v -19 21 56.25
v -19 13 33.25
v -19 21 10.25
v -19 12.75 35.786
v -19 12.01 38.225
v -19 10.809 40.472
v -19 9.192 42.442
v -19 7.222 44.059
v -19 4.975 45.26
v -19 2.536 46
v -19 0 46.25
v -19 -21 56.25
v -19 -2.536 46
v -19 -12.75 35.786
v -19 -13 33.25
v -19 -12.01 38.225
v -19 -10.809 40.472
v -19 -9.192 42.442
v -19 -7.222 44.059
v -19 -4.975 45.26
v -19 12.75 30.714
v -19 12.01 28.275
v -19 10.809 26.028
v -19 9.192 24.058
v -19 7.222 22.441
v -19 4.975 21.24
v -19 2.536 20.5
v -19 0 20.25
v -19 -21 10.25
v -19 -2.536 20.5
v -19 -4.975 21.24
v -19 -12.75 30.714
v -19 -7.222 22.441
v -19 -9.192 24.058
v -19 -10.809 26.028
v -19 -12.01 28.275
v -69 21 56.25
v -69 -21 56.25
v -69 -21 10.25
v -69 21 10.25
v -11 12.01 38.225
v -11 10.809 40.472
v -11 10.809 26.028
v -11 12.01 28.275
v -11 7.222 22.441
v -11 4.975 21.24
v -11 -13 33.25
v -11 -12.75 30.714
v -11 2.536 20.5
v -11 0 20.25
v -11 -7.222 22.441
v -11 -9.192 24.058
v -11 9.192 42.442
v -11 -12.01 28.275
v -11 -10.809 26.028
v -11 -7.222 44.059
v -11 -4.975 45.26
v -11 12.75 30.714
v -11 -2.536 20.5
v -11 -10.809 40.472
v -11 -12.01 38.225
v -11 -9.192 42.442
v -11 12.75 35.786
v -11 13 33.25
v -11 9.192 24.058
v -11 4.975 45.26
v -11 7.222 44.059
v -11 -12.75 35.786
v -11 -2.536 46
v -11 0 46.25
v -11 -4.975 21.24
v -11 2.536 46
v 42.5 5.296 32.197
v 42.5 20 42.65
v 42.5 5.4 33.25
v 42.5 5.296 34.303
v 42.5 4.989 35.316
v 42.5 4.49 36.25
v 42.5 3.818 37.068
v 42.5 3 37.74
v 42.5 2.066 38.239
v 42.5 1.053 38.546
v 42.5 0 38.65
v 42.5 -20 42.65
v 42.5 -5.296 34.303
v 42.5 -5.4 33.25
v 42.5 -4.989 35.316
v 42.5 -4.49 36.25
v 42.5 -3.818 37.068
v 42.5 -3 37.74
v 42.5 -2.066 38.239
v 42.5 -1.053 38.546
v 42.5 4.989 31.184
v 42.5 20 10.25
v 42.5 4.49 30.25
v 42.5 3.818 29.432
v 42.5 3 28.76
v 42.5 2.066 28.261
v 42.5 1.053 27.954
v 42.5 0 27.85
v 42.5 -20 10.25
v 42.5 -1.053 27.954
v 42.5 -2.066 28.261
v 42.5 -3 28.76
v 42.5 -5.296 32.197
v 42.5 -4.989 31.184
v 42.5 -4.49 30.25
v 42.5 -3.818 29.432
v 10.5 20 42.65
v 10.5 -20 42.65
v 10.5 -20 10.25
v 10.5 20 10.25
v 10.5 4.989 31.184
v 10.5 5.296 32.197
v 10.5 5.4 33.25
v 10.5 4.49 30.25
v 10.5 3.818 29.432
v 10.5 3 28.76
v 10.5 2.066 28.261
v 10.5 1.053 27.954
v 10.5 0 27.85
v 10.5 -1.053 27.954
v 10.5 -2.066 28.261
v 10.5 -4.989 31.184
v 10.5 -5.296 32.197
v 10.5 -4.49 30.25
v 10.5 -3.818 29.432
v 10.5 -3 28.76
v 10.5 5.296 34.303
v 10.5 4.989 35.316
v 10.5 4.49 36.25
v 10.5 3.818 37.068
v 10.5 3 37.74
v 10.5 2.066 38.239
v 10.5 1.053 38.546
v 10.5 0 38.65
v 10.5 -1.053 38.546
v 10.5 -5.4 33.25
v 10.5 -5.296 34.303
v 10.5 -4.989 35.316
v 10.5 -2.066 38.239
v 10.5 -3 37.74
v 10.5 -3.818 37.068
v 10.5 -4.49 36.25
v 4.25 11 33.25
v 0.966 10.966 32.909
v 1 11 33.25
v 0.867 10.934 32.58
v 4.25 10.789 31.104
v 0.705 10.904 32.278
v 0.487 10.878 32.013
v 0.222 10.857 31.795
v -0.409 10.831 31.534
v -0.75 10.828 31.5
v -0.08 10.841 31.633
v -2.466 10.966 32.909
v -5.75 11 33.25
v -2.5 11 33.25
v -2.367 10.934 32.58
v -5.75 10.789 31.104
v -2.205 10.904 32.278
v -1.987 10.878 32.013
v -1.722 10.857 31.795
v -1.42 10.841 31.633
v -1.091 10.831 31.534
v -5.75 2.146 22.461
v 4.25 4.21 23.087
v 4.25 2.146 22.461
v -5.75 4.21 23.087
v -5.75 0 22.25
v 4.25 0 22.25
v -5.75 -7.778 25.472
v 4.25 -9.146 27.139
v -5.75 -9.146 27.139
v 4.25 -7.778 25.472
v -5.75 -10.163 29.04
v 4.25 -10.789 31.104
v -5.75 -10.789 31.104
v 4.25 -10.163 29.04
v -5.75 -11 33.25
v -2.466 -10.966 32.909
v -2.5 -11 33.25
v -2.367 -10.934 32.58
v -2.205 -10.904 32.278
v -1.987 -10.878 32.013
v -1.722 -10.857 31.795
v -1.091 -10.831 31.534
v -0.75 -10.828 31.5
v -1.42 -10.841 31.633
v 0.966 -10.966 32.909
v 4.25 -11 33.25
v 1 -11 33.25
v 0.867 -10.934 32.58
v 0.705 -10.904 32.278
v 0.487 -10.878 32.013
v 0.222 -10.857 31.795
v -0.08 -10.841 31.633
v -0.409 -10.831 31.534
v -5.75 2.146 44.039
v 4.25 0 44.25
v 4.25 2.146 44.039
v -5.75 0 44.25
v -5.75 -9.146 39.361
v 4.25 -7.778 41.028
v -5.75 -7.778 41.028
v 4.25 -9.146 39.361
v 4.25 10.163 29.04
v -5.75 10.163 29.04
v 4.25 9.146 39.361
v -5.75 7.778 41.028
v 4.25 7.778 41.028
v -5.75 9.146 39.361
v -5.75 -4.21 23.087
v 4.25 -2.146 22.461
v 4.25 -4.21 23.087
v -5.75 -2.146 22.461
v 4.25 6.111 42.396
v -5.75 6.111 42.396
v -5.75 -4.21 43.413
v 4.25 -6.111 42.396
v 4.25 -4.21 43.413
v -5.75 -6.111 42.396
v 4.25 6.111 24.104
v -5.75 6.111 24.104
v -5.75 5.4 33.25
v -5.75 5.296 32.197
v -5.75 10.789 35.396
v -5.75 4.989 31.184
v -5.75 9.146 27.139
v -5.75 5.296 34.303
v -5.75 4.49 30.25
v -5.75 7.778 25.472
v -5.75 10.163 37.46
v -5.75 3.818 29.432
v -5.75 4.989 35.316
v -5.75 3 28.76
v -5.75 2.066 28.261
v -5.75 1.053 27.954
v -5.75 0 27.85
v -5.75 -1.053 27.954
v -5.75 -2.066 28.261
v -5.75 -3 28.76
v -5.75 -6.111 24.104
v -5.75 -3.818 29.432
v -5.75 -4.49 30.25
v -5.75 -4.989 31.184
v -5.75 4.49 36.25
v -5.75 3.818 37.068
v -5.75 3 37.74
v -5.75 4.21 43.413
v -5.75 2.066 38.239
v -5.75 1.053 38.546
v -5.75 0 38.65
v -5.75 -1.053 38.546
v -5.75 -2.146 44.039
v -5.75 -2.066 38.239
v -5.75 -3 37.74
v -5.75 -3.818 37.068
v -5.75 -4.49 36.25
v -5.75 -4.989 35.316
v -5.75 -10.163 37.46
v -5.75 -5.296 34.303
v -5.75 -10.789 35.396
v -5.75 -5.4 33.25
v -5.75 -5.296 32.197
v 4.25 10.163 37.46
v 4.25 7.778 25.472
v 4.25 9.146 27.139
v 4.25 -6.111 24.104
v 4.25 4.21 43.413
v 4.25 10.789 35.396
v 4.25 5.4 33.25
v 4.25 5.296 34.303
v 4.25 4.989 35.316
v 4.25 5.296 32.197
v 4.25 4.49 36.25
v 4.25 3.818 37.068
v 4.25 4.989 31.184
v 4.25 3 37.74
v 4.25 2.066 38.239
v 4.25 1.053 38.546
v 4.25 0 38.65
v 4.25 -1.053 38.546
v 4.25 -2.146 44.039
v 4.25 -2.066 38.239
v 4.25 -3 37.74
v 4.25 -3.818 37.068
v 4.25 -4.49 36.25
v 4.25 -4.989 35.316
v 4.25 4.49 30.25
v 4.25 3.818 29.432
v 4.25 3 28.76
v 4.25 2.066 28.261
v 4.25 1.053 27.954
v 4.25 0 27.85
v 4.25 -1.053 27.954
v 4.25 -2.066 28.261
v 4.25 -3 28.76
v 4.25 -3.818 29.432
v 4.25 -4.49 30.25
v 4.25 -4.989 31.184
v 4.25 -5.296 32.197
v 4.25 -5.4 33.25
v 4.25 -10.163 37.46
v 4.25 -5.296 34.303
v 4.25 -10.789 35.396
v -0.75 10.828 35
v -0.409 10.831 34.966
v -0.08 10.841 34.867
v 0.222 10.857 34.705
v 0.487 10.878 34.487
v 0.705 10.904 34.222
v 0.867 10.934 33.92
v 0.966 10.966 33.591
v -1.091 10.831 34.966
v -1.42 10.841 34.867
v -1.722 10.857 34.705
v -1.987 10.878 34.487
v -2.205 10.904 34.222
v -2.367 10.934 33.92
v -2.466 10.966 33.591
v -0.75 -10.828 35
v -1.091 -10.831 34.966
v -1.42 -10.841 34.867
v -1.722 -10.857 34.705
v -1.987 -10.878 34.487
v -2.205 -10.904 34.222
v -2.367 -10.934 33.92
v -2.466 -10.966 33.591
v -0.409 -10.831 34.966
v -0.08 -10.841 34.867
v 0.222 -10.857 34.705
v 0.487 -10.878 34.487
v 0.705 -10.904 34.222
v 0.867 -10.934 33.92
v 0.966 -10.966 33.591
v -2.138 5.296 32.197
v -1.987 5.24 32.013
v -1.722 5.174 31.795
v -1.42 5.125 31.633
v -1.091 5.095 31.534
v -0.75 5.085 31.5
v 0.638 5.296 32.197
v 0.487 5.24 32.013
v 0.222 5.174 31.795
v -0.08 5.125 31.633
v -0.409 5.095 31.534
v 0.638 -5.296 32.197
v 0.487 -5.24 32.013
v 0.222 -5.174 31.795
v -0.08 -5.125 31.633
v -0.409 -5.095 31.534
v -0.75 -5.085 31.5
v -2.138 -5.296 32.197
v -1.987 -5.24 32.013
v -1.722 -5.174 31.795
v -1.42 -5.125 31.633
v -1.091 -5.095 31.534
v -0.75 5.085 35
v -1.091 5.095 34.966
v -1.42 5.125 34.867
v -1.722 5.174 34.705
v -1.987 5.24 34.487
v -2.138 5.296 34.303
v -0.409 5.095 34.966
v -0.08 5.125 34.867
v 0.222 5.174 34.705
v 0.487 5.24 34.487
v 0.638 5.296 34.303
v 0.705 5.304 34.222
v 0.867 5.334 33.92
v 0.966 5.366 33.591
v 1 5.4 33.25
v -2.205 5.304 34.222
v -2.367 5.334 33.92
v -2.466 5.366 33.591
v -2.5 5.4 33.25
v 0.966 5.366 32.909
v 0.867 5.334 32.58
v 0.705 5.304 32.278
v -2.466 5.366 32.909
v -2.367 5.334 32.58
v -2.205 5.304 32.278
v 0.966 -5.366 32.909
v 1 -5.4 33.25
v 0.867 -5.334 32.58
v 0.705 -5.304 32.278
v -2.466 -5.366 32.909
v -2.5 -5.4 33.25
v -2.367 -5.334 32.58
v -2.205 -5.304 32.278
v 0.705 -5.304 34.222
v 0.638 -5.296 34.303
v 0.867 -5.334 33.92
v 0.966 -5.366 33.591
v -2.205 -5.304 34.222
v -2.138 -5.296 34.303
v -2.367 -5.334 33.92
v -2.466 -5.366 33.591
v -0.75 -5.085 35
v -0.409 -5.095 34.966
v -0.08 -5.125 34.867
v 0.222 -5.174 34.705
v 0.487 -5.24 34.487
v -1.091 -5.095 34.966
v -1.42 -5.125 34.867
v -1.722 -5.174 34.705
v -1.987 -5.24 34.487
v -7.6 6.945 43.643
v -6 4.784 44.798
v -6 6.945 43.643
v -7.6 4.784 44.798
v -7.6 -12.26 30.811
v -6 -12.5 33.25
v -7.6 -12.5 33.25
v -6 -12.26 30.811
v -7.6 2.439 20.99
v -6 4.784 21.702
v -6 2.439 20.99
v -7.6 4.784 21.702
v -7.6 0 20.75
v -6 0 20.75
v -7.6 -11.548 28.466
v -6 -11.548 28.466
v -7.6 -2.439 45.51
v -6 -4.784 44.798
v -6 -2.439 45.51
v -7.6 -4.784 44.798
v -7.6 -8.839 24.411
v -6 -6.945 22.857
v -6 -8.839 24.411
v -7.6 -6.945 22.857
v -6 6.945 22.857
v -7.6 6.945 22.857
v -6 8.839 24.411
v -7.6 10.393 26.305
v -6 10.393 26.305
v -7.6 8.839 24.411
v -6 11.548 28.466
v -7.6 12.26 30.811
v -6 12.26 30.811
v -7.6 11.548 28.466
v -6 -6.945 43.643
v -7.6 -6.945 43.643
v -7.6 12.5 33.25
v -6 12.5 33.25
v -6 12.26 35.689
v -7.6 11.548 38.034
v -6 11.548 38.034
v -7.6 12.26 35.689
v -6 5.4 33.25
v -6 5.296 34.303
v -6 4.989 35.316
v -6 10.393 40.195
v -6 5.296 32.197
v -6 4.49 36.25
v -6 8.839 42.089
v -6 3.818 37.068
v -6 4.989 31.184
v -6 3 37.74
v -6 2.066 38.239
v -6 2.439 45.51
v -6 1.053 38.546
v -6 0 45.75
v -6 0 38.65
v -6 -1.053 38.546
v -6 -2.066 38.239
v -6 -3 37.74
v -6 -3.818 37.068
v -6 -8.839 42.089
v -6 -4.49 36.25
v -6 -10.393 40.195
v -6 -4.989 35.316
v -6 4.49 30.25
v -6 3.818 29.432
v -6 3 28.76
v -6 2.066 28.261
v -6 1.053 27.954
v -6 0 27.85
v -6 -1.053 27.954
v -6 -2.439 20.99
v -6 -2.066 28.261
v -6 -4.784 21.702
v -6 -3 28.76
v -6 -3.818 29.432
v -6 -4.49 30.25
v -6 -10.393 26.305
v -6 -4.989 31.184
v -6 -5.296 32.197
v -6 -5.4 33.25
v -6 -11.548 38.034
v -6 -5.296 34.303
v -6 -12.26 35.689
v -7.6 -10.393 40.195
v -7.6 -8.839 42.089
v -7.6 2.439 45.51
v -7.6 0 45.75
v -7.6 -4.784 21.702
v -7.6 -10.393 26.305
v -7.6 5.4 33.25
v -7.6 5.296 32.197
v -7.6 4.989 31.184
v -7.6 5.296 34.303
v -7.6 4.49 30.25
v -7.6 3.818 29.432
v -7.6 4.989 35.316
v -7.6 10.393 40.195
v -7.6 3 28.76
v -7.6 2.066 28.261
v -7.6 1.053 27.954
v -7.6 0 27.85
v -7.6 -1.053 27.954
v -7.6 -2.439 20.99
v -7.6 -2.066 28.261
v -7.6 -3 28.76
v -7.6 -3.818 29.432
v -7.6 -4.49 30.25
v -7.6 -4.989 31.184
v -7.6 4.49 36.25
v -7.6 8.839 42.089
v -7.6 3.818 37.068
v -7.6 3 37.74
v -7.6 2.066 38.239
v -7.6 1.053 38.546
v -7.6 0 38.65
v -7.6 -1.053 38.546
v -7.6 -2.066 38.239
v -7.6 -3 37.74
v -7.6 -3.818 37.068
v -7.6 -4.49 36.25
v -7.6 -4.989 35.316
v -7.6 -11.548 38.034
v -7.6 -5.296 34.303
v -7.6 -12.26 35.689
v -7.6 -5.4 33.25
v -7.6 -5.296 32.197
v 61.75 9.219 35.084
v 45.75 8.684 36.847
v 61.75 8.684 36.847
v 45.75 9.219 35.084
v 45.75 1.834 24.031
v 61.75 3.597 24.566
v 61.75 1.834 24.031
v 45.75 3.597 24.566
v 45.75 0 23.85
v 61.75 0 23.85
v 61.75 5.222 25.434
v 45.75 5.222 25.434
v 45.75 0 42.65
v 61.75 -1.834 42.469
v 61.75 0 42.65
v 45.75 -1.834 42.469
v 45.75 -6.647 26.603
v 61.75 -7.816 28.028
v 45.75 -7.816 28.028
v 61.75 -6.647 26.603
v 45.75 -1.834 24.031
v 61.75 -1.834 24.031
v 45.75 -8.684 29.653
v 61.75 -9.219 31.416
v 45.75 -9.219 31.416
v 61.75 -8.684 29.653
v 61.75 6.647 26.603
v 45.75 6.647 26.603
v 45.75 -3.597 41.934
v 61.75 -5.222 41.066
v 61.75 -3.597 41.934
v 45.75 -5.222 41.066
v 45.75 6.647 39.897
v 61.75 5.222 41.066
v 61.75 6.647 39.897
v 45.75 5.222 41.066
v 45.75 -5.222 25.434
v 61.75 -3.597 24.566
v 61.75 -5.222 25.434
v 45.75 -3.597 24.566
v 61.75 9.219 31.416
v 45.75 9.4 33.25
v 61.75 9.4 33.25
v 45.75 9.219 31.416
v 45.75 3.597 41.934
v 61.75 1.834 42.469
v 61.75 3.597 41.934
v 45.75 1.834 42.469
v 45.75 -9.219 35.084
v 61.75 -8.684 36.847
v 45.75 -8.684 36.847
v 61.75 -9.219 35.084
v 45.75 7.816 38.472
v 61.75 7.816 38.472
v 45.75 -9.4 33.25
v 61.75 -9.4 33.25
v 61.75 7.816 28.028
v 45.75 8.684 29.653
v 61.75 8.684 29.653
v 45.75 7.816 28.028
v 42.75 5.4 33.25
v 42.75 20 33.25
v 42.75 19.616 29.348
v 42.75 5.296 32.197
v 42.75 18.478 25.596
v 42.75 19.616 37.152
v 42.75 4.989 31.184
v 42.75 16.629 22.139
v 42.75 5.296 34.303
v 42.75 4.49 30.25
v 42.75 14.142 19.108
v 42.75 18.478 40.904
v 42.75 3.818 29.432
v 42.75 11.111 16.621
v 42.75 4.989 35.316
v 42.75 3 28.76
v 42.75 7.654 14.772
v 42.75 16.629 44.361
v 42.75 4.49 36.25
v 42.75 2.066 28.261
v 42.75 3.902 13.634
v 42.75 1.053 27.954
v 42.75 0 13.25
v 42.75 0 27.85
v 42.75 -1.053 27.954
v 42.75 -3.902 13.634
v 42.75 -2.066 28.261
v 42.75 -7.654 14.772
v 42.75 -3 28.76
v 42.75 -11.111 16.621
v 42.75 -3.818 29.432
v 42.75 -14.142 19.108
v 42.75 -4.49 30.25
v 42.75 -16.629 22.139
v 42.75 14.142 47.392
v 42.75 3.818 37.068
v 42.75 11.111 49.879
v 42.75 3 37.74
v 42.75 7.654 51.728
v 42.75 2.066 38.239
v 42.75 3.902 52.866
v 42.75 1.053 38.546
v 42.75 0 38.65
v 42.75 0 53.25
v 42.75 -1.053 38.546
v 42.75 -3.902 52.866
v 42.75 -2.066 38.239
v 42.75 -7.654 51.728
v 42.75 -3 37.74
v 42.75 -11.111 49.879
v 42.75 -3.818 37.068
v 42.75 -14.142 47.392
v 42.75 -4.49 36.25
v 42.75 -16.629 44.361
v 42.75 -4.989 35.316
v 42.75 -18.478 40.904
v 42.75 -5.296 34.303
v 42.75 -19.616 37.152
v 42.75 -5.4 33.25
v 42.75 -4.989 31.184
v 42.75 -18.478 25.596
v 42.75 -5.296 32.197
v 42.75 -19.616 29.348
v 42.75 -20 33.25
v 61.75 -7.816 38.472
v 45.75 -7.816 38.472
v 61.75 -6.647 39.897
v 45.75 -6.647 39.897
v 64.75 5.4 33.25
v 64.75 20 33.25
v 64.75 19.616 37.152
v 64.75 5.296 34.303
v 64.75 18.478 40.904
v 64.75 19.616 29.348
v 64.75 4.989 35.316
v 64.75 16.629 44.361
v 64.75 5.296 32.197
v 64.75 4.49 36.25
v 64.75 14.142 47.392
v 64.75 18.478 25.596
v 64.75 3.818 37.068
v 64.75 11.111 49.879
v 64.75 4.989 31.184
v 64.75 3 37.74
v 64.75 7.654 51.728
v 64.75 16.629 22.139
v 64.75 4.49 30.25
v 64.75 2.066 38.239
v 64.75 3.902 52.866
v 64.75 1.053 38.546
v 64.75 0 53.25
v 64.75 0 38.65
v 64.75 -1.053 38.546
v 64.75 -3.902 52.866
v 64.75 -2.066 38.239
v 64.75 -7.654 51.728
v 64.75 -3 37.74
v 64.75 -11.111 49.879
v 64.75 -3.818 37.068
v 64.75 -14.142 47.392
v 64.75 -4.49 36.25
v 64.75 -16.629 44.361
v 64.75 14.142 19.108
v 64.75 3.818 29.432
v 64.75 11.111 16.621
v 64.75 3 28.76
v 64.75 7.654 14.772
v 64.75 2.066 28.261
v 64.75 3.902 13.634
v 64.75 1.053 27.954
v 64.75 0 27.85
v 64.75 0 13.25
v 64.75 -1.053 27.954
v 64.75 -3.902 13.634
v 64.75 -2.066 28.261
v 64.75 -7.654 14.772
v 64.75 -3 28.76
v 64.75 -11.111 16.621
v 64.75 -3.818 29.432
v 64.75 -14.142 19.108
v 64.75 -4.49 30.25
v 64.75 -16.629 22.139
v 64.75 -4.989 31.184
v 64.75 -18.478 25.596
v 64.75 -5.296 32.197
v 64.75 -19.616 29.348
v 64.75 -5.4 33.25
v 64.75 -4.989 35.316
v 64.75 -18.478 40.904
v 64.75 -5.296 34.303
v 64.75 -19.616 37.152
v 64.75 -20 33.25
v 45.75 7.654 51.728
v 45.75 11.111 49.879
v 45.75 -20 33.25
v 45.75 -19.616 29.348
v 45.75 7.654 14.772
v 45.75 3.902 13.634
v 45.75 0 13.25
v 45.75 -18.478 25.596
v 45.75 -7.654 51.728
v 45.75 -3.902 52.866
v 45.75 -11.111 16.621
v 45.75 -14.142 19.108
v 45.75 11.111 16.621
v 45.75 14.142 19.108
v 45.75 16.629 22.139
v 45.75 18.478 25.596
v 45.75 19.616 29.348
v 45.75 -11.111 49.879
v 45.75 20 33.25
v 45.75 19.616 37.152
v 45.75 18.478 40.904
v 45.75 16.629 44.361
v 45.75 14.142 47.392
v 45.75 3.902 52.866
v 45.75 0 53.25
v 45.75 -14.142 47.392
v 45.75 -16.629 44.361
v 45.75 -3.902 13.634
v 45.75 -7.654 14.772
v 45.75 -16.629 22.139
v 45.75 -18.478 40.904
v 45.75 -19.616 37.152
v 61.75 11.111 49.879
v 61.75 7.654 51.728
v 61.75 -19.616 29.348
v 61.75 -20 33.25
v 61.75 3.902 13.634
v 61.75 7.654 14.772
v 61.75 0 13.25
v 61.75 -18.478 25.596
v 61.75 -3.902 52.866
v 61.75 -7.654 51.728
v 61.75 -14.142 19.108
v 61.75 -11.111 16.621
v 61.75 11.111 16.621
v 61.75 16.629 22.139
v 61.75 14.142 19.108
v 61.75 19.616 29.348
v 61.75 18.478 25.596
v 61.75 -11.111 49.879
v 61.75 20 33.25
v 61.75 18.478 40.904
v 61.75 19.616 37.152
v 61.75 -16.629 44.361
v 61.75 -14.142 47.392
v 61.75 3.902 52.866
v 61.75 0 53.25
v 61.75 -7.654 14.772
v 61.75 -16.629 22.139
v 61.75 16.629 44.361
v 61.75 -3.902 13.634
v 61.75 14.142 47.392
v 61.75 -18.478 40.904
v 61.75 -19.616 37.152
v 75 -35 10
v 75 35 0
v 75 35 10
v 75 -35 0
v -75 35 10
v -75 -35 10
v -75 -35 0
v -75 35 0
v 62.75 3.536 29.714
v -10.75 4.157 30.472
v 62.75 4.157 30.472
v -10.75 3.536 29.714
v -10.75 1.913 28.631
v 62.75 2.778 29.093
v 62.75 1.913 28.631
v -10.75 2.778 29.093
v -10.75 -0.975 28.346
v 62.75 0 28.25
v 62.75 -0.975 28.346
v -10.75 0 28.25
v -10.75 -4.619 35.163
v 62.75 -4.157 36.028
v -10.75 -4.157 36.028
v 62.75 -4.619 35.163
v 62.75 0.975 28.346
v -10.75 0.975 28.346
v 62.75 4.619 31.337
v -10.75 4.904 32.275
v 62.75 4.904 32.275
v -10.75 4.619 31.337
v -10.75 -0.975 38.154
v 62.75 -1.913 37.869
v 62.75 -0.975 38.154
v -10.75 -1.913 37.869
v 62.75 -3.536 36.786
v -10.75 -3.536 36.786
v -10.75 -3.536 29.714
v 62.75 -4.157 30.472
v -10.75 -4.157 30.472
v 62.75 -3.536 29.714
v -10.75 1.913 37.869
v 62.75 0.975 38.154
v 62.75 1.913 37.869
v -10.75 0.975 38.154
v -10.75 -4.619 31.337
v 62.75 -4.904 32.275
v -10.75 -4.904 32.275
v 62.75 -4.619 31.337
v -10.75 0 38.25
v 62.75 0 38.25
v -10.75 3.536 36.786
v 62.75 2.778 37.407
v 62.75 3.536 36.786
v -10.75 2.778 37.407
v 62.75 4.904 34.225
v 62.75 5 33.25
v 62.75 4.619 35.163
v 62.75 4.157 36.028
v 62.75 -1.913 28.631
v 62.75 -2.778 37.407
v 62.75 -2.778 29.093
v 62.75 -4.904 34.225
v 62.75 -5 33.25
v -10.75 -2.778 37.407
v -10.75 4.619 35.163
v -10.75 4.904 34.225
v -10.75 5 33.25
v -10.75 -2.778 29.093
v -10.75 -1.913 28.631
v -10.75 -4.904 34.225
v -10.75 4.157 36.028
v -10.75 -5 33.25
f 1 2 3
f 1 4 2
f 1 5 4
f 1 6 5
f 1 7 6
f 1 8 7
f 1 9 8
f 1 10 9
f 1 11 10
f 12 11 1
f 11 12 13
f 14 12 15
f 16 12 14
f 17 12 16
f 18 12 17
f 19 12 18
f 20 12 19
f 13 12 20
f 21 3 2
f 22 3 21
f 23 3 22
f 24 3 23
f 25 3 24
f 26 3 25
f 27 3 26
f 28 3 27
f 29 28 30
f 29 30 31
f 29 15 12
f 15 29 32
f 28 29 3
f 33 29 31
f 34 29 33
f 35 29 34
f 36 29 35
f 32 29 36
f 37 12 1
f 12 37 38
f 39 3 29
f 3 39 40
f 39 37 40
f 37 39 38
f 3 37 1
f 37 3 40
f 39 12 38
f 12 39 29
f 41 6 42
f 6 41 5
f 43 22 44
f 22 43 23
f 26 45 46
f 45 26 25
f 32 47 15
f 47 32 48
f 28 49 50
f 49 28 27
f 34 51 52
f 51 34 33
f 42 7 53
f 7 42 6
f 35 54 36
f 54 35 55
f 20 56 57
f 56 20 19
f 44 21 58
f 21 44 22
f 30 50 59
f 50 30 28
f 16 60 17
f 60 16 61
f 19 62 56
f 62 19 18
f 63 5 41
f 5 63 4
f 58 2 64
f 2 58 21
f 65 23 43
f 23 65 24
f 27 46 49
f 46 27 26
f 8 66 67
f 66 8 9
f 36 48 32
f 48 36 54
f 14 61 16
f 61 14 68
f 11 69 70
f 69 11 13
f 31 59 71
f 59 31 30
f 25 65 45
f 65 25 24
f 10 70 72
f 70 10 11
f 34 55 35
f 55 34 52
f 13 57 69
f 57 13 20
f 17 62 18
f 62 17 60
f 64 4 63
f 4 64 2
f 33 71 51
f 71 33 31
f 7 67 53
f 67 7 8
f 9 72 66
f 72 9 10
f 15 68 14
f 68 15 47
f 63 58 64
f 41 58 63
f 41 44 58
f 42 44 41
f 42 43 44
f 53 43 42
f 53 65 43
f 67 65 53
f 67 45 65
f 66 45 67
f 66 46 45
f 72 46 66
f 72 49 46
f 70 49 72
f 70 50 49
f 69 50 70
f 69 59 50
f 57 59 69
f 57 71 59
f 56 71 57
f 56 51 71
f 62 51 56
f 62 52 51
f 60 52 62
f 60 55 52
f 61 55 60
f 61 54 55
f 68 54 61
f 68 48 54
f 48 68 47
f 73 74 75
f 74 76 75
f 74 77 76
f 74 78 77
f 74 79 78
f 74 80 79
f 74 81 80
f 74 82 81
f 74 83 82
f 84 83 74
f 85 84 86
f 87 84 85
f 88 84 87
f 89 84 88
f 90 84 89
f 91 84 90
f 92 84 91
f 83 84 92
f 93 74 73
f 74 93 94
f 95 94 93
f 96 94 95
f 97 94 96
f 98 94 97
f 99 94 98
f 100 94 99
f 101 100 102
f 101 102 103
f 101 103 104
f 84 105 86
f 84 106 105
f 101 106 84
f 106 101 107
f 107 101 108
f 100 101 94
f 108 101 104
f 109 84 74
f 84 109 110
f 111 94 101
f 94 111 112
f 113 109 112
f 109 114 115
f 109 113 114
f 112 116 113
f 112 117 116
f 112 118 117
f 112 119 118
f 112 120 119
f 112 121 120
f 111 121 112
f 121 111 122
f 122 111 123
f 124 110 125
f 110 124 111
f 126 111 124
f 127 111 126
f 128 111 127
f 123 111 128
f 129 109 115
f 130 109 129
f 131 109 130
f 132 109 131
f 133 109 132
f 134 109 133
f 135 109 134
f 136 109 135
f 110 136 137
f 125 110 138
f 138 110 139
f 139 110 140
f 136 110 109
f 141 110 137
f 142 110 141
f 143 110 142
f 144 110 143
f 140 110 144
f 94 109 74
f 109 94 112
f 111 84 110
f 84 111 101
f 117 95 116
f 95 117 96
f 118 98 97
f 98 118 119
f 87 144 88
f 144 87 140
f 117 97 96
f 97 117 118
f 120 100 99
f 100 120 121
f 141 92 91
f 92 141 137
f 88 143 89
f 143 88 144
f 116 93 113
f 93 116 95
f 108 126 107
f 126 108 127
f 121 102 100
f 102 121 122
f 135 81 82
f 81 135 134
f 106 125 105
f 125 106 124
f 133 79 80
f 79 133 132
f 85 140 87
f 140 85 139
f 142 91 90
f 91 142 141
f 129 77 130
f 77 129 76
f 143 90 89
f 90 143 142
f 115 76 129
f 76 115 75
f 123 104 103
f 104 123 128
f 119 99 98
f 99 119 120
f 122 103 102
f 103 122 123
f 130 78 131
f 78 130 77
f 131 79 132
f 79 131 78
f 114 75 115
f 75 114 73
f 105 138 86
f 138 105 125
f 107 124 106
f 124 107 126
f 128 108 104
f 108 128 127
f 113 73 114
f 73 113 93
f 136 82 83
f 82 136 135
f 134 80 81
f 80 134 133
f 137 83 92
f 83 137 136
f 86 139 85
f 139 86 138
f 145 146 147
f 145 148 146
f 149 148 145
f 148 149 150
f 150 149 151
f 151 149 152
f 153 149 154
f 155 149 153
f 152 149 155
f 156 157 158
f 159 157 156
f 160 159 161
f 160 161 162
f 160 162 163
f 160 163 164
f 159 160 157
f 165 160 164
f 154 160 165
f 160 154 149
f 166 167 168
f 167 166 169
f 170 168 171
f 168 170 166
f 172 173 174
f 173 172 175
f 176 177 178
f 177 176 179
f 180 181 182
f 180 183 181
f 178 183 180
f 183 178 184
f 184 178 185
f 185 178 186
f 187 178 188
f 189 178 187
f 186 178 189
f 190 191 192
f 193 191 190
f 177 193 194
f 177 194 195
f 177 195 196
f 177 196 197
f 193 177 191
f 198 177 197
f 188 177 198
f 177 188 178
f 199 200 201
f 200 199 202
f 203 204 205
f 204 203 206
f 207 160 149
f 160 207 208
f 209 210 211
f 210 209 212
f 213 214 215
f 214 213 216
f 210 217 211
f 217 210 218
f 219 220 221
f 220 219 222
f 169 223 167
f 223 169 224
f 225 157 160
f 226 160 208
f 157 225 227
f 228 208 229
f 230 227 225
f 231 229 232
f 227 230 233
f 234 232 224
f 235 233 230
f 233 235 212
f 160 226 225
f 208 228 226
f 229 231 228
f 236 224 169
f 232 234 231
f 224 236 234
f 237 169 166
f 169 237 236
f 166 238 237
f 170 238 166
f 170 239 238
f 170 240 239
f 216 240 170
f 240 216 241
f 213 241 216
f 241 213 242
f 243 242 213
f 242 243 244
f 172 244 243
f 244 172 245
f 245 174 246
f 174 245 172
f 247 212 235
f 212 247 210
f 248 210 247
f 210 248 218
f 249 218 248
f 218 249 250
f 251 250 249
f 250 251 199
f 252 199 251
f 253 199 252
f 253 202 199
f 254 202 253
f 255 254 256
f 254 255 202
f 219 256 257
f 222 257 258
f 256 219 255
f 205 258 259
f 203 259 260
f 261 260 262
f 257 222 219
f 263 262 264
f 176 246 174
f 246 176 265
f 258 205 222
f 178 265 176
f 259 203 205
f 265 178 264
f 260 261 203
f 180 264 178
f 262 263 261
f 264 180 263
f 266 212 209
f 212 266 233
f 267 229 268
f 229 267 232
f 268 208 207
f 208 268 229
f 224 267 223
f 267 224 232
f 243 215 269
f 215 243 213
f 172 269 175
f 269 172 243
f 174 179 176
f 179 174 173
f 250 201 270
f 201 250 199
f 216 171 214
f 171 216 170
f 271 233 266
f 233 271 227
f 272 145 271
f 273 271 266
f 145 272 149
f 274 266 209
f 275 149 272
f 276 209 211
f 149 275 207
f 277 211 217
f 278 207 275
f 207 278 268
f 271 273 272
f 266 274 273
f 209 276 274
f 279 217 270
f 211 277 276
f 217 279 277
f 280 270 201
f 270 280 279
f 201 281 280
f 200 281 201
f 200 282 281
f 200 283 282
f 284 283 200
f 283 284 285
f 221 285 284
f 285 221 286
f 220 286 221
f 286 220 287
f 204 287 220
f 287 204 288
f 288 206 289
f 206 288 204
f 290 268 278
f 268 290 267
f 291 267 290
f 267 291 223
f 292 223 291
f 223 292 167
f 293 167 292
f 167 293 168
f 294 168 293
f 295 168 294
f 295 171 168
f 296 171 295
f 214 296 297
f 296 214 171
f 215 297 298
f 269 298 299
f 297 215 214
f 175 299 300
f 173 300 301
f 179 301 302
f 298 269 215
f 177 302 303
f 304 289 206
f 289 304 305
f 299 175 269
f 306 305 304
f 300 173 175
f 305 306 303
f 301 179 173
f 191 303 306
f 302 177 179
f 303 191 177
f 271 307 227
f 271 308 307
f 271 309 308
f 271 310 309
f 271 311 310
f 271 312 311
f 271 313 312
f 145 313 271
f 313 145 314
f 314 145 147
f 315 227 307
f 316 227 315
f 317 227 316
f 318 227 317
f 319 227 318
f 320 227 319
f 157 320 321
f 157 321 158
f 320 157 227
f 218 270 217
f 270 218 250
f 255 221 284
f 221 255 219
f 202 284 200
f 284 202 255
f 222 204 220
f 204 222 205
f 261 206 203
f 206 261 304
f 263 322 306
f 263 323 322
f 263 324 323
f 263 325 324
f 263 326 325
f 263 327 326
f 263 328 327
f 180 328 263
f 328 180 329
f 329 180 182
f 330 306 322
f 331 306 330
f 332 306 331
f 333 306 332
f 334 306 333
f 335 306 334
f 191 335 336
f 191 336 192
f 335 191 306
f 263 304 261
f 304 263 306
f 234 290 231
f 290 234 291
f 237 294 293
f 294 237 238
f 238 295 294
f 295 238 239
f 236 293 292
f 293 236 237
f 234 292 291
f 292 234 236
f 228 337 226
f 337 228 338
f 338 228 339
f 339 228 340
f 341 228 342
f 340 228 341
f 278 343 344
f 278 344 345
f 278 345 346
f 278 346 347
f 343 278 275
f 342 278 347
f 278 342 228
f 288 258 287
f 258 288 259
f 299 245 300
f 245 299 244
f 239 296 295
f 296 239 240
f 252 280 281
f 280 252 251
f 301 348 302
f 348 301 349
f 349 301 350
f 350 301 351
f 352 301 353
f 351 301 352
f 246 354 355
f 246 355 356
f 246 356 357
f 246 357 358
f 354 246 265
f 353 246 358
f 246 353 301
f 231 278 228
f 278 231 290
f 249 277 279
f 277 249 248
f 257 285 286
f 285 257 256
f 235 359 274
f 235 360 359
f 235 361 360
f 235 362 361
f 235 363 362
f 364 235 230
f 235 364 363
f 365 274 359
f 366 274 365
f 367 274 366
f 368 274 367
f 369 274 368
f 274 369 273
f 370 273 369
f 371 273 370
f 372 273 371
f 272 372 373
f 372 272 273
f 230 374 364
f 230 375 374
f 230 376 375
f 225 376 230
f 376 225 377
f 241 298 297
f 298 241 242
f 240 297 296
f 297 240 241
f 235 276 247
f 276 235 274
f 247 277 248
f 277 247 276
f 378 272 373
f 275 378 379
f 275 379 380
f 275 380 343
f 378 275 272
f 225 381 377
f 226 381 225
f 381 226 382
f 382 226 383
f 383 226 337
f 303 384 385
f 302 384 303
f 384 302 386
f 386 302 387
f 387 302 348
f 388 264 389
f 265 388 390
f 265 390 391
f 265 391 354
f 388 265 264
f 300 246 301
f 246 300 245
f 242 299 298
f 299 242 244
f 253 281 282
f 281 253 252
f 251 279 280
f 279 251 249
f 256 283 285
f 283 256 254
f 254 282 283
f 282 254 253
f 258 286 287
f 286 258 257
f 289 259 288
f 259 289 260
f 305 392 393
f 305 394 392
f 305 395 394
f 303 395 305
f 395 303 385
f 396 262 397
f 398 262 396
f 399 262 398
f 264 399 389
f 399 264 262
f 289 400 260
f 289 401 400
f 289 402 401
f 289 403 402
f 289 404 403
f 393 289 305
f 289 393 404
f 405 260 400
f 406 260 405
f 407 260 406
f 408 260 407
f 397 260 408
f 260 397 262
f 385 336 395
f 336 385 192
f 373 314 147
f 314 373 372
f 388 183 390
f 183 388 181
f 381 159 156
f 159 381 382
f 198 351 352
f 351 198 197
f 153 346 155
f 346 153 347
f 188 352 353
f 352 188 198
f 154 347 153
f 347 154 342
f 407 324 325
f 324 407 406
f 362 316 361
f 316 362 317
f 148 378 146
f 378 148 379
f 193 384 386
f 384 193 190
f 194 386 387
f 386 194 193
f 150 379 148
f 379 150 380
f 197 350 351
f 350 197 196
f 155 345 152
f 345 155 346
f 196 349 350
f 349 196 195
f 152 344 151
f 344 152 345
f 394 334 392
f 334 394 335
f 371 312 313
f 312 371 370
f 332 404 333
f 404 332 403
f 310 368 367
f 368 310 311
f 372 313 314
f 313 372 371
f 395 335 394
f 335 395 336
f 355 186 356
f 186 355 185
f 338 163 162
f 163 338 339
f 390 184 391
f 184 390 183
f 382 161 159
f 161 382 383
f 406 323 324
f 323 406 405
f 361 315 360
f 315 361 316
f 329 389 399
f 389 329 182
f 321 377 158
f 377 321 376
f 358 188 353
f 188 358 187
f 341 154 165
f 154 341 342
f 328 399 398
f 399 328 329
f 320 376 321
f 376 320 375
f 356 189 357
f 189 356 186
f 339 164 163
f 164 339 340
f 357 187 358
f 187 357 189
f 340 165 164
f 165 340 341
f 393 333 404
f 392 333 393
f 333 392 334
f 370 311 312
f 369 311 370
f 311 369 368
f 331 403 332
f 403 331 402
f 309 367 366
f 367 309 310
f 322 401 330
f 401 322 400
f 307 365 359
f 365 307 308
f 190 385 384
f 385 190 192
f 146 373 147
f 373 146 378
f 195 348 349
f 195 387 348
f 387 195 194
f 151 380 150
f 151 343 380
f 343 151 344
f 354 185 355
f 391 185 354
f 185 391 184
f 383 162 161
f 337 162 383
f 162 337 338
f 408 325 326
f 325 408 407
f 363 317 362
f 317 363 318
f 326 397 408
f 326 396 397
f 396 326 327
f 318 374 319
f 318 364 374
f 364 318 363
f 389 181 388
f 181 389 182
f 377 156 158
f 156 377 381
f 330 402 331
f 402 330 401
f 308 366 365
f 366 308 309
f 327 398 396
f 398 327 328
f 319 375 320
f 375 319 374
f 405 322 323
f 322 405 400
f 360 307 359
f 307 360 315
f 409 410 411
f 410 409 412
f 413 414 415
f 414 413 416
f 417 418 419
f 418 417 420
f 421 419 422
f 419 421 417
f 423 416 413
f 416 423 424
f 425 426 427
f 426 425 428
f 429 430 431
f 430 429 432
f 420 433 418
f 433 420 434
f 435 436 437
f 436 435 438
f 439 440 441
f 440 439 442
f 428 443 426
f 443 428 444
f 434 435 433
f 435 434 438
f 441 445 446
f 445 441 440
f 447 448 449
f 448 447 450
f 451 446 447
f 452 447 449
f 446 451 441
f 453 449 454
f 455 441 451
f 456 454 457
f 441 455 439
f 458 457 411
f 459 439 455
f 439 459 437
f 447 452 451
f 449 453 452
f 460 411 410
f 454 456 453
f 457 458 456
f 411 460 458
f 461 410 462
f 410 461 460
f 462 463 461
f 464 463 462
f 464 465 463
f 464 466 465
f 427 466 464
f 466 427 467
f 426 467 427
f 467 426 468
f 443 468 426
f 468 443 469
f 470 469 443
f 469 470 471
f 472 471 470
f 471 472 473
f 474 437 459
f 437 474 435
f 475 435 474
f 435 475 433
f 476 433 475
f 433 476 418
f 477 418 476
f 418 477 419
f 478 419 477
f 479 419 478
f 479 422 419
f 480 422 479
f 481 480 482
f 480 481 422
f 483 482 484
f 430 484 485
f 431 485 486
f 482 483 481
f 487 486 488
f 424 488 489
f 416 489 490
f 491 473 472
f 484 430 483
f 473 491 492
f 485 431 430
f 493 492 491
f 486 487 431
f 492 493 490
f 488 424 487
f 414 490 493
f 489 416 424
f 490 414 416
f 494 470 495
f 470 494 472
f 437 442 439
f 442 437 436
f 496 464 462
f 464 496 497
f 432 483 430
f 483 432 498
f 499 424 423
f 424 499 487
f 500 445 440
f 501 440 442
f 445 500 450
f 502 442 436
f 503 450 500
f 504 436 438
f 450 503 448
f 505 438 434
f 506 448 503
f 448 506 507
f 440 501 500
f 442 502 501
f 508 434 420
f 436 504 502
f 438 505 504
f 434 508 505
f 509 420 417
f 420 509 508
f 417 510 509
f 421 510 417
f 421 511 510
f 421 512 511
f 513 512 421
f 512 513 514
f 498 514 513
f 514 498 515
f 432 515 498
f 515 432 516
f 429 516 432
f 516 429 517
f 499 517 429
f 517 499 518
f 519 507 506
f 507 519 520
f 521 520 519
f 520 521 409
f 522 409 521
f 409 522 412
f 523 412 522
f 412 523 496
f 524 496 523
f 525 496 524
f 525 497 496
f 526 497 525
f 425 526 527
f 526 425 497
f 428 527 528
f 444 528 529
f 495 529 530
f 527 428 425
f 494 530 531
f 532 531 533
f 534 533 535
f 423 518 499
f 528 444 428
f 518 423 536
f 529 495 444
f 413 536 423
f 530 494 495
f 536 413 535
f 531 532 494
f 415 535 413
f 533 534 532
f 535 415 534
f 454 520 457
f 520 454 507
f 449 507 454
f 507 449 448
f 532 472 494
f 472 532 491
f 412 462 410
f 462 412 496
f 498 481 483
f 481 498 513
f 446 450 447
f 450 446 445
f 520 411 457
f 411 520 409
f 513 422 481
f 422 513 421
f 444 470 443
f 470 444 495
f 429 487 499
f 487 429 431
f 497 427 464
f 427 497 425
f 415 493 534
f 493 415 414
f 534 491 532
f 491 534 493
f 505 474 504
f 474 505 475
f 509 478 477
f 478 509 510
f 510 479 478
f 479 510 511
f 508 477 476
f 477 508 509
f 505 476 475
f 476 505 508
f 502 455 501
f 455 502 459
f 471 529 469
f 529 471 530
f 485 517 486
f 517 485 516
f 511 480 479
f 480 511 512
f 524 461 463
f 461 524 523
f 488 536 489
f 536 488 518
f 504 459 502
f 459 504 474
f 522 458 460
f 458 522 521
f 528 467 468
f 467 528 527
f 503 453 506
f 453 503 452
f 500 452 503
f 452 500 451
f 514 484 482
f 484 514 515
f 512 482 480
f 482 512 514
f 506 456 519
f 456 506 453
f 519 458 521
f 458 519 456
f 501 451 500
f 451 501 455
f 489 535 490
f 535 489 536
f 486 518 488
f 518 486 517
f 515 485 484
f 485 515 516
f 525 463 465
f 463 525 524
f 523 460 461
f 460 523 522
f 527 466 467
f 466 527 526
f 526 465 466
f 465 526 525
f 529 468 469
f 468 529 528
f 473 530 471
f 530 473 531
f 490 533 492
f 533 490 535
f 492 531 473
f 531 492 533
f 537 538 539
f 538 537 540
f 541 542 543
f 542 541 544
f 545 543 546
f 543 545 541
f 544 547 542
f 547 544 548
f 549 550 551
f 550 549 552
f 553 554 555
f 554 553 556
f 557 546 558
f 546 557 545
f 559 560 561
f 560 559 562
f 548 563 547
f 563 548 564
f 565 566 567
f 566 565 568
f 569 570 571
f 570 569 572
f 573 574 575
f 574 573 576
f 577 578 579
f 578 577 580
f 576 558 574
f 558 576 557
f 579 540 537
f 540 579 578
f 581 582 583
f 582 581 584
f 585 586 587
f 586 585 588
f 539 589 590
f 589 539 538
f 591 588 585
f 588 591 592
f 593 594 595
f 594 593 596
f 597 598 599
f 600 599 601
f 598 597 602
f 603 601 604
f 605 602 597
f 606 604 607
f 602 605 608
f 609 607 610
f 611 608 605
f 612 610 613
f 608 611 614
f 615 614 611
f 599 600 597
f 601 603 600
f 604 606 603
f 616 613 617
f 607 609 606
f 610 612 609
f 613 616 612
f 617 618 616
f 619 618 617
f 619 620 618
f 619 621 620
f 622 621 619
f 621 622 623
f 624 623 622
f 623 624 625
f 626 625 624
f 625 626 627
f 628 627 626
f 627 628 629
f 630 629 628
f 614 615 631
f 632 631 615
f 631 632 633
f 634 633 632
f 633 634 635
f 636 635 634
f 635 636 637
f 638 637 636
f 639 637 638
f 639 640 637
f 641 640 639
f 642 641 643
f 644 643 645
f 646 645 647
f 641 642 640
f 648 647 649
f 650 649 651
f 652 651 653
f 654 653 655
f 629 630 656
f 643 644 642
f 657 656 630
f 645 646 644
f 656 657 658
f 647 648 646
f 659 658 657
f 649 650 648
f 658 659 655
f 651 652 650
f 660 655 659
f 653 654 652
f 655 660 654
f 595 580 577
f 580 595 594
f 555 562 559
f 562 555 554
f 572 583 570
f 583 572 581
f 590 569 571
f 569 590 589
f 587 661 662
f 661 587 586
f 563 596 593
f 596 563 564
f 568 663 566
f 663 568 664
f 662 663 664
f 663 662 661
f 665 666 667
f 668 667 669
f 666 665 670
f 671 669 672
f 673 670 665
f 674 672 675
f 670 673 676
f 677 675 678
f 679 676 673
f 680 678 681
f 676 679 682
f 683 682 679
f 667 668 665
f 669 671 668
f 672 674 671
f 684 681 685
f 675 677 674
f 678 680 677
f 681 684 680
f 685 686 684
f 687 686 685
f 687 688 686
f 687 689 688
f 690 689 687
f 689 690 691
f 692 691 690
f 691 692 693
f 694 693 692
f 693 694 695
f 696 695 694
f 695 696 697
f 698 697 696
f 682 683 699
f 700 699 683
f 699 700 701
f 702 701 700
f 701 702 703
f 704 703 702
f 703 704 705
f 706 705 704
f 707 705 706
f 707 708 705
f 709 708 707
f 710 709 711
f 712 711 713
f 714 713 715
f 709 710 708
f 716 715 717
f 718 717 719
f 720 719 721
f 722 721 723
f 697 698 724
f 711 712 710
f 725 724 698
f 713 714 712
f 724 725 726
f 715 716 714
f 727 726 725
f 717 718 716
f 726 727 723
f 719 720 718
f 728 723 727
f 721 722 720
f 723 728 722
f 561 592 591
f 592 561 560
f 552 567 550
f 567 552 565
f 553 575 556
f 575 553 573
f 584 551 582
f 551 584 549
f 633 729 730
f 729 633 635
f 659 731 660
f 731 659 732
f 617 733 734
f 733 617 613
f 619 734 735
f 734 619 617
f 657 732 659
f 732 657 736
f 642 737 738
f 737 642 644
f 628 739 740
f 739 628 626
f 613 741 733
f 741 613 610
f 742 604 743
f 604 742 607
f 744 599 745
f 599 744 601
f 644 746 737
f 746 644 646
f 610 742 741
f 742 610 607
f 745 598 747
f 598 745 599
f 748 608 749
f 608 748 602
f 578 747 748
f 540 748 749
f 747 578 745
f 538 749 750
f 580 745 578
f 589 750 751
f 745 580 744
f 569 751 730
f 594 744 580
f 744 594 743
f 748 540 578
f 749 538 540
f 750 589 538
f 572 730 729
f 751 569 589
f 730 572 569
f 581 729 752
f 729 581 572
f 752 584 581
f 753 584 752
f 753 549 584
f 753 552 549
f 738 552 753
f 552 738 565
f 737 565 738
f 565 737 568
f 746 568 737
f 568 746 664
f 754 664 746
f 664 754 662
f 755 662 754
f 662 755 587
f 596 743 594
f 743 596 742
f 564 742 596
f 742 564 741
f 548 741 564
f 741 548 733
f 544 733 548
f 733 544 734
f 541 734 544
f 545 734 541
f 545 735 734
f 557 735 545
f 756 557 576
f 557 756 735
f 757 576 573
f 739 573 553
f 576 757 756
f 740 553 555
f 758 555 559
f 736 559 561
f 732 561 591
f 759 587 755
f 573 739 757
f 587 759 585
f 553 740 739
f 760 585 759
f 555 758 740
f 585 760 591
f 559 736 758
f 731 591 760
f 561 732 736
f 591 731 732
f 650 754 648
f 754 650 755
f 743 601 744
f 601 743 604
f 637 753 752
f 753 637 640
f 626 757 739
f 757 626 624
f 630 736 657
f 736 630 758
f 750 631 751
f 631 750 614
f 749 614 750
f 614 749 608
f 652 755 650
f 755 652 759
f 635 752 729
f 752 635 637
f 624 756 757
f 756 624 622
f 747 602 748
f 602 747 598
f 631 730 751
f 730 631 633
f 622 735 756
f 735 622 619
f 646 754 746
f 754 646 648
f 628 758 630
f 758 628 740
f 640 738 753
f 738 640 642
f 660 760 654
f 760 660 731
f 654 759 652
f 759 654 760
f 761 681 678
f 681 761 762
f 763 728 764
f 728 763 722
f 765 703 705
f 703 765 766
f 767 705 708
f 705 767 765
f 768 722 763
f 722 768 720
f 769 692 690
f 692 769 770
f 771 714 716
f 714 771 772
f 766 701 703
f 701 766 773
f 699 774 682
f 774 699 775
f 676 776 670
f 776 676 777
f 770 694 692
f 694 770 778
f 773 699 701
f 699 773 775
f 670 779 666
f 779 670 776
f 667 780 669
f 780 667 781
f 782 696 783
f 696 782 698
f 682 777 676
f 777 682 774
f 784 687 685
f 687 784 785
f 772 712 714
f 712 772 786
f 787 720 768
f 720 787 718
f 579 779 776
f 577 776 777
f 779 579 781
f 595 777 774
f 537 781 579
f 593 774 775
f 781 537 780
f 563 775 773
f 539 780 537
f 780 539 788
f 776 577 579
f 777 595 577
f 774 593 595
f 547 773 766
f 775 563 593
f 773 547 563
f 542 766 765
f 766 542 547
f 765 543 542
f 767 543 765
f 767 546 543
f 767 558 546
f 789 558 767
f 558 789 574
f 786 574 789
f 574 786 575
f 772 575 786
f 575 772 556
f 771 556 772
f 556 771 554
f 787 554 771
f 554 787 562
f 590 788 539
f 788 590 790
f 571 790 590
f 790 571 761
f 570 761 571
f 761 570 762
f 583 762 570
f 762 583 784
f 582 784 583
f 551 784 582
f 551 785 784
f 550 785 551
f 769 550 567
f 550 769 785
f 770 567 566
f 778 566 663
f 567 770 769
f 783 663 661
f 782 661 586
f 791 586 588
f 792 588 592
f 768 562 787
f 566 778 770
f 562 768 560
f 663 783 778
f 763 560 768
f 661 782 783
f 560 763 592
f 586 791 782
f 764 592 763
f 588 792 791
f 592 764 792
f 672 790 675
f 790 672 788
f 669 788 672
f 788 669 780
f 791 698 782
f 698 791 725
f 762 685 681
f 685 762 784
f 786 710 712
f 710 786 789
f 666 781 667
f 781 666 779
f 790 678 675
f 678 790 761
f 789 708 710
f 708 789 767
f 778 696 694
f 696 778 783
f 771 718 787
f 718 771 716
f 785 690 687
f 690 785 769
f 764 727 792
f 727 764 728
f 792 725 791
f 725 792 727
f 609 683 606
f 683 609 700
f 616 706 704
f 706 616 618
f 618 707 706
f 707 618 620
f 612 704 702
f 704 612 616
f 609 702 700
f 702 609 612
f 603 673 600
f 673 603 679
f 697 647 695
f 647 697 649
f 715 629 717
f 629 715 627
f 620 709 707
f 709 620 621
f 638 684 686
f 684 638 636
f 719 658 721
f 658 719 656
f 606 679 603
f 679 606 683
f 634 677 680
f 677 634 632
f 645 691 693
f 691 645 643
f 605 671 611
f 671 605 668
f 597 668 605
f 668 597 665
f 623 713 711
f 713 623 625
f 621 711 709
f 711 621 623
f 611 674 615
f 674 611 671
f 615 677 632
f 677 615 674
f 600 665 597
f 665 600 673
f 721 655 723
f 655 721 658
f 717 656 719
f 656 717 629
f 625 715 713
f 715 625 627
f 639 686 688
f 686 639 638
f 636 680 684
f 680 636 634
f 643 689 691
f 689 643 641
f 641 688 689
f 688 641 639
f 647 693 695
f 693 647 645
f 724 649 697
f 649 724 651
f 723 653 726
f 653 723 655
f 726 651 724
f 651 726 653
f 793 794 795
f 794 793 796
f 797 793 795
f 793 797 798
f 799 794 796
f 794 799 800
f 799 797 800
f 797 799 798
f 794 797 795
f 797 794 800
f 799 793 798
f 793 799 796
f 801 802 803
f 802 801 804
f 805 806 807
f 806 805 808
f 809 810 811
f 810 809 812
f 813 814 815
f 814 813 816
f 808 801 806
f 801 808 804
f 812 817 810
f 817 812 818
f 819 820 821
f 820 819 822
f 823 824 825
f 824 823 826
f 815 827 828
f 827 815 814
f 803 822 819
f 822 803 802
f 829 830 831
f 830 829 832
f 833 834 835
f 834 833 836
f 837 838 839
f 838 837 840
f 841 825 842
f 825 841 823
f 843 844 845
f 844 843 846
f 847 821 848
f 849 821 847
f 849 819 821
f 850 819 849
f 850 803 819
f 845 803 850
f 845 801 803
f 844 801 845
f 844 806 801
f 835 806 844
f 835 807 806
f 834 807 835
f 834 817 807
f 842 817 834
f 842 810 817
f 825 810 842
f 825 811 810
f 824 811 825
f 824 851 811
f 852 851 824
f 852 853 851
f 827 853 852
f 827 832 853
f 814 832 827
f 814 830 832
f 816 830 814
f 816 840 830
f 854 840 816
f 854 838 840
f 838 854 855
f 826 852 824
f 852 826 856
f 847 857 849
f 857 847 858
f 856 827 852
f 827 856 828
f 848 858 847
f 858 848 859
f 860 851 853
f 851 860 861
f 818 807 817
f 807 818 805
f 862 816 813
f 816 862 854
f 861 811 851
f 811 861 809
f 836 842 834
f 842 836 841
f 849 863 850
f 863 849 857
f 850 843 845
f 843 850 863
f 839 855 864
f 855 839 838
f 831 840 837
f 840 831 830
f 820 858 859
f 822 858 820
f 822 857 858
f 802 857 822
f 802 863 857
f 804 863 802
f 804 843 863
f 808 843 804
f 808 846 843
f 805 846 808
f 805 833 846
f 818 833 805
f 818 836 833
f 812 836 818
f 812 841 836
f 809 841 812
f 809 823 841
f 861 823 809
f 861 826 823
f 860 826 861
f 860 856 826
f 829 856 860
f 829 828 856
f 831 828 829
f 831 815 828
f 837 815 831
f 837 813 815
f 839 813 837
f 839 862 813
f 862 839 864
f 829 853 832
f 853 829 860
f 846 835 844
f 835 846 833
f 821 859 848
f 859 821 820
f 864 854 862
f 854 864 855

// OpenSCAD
$fn = 32;

// ------------------------------------------------------------------------
// Motor drive station: motor 50 x 46 mm, shaft d10, pulley d40
// Every part is its own module, assembly() places every instance.
// ------------------------------------------------------------------------

// --- part 1 ---
module station_bed() {
  difference() {
    translate([-75, -35, 0]) cube([150, 70, 10]);
  }
}

// --- part 2 ---
module drive_motor() {
  union() {
    translate([-25, -21, 0]) cube([50, 42, 46]);
    translate([29, 0, 23]) rotate([0, 90, 0]) cylinder(h = 8, d = 26, center = true);
  }
}

// --- part 3 ---
module pillow_block() {
  difference() {
    translate([-16, -20, 0]) cube([32, 40, 32.4]);
    translate([0, 0, 23]) rotate([0, 90, 0]) cylinder(h = 34, d = 10.8, center = true);
  }
}

// --- part 4 ---
module drive_shaft() {
  translate([0, 0, -36.75]) cylinder(h = 73.5, d = 10);
}

// --- part 5 ---
module shaft_collar() {
  difference() {
    cylinder(h = 10, d = 22);
    translate([0, 0, -1]) cylinder(h = 12, d = 10.8);
    translate([0, 0, 5]) rotate([90, 0, 0]) cylinder(h = 24, d = 3.5, center = true);
  }
}

// --- part 6 ---
module collar_washer() {
  difference() {
      translate([0, 0, 0]) cylinder(h = 1.6, d = 25);
      translate([0, 0, -1]) cylinder(h = 3.6, d = 10.8);
    }
}

// --- part 7 ---
module drive_pulley() {
  difference() {
    union() {
      cylinder(h = 22, d = 18.8);
      cylinder(h = 3, d = 40);
      translate([0, 0, 19]) cylinder(h = 3, d = 40);
    }
    translate([0, 0, -1]) cylinder(h = 24, d = 10.8);
  }
}

// --- assembly ---
module assembly() {
  color([0.80, 0.24, 0.20]) translate([0, 0, 0]) rotate([0, 0, 0]) station_bed();
  color([0.20, 0.45, 0.75]) translate([-44, 0, 10.25]) rotate([0, 0, 0]) drive_motor();
  color([0.25, 0.62, 0.32]) translate([26.5, 0, 10.25]) rotate([0, 0, 0]) pillow_block();
  color([0.92, 0.70, 0.18]) translate([26, 0, 33.25]) rotate([0, 90, 0]) drive_shaft();
  color([0.58, 0.35, 0.70]) translate([-5.75, 0, 33.25]) rotate([0, 90, 0]) shaft_collar();
  color([0.16, 0.66, 0.66]) translate([-7.6, 0, 33.25]) rotate([0, 90, 0]) collar_washer();
  color([0.85, 0.48, 0.18]) translate([42.75, 0, 33.25]) rotate([0, 90, 0]) drive_pulley();
}

assembly();
